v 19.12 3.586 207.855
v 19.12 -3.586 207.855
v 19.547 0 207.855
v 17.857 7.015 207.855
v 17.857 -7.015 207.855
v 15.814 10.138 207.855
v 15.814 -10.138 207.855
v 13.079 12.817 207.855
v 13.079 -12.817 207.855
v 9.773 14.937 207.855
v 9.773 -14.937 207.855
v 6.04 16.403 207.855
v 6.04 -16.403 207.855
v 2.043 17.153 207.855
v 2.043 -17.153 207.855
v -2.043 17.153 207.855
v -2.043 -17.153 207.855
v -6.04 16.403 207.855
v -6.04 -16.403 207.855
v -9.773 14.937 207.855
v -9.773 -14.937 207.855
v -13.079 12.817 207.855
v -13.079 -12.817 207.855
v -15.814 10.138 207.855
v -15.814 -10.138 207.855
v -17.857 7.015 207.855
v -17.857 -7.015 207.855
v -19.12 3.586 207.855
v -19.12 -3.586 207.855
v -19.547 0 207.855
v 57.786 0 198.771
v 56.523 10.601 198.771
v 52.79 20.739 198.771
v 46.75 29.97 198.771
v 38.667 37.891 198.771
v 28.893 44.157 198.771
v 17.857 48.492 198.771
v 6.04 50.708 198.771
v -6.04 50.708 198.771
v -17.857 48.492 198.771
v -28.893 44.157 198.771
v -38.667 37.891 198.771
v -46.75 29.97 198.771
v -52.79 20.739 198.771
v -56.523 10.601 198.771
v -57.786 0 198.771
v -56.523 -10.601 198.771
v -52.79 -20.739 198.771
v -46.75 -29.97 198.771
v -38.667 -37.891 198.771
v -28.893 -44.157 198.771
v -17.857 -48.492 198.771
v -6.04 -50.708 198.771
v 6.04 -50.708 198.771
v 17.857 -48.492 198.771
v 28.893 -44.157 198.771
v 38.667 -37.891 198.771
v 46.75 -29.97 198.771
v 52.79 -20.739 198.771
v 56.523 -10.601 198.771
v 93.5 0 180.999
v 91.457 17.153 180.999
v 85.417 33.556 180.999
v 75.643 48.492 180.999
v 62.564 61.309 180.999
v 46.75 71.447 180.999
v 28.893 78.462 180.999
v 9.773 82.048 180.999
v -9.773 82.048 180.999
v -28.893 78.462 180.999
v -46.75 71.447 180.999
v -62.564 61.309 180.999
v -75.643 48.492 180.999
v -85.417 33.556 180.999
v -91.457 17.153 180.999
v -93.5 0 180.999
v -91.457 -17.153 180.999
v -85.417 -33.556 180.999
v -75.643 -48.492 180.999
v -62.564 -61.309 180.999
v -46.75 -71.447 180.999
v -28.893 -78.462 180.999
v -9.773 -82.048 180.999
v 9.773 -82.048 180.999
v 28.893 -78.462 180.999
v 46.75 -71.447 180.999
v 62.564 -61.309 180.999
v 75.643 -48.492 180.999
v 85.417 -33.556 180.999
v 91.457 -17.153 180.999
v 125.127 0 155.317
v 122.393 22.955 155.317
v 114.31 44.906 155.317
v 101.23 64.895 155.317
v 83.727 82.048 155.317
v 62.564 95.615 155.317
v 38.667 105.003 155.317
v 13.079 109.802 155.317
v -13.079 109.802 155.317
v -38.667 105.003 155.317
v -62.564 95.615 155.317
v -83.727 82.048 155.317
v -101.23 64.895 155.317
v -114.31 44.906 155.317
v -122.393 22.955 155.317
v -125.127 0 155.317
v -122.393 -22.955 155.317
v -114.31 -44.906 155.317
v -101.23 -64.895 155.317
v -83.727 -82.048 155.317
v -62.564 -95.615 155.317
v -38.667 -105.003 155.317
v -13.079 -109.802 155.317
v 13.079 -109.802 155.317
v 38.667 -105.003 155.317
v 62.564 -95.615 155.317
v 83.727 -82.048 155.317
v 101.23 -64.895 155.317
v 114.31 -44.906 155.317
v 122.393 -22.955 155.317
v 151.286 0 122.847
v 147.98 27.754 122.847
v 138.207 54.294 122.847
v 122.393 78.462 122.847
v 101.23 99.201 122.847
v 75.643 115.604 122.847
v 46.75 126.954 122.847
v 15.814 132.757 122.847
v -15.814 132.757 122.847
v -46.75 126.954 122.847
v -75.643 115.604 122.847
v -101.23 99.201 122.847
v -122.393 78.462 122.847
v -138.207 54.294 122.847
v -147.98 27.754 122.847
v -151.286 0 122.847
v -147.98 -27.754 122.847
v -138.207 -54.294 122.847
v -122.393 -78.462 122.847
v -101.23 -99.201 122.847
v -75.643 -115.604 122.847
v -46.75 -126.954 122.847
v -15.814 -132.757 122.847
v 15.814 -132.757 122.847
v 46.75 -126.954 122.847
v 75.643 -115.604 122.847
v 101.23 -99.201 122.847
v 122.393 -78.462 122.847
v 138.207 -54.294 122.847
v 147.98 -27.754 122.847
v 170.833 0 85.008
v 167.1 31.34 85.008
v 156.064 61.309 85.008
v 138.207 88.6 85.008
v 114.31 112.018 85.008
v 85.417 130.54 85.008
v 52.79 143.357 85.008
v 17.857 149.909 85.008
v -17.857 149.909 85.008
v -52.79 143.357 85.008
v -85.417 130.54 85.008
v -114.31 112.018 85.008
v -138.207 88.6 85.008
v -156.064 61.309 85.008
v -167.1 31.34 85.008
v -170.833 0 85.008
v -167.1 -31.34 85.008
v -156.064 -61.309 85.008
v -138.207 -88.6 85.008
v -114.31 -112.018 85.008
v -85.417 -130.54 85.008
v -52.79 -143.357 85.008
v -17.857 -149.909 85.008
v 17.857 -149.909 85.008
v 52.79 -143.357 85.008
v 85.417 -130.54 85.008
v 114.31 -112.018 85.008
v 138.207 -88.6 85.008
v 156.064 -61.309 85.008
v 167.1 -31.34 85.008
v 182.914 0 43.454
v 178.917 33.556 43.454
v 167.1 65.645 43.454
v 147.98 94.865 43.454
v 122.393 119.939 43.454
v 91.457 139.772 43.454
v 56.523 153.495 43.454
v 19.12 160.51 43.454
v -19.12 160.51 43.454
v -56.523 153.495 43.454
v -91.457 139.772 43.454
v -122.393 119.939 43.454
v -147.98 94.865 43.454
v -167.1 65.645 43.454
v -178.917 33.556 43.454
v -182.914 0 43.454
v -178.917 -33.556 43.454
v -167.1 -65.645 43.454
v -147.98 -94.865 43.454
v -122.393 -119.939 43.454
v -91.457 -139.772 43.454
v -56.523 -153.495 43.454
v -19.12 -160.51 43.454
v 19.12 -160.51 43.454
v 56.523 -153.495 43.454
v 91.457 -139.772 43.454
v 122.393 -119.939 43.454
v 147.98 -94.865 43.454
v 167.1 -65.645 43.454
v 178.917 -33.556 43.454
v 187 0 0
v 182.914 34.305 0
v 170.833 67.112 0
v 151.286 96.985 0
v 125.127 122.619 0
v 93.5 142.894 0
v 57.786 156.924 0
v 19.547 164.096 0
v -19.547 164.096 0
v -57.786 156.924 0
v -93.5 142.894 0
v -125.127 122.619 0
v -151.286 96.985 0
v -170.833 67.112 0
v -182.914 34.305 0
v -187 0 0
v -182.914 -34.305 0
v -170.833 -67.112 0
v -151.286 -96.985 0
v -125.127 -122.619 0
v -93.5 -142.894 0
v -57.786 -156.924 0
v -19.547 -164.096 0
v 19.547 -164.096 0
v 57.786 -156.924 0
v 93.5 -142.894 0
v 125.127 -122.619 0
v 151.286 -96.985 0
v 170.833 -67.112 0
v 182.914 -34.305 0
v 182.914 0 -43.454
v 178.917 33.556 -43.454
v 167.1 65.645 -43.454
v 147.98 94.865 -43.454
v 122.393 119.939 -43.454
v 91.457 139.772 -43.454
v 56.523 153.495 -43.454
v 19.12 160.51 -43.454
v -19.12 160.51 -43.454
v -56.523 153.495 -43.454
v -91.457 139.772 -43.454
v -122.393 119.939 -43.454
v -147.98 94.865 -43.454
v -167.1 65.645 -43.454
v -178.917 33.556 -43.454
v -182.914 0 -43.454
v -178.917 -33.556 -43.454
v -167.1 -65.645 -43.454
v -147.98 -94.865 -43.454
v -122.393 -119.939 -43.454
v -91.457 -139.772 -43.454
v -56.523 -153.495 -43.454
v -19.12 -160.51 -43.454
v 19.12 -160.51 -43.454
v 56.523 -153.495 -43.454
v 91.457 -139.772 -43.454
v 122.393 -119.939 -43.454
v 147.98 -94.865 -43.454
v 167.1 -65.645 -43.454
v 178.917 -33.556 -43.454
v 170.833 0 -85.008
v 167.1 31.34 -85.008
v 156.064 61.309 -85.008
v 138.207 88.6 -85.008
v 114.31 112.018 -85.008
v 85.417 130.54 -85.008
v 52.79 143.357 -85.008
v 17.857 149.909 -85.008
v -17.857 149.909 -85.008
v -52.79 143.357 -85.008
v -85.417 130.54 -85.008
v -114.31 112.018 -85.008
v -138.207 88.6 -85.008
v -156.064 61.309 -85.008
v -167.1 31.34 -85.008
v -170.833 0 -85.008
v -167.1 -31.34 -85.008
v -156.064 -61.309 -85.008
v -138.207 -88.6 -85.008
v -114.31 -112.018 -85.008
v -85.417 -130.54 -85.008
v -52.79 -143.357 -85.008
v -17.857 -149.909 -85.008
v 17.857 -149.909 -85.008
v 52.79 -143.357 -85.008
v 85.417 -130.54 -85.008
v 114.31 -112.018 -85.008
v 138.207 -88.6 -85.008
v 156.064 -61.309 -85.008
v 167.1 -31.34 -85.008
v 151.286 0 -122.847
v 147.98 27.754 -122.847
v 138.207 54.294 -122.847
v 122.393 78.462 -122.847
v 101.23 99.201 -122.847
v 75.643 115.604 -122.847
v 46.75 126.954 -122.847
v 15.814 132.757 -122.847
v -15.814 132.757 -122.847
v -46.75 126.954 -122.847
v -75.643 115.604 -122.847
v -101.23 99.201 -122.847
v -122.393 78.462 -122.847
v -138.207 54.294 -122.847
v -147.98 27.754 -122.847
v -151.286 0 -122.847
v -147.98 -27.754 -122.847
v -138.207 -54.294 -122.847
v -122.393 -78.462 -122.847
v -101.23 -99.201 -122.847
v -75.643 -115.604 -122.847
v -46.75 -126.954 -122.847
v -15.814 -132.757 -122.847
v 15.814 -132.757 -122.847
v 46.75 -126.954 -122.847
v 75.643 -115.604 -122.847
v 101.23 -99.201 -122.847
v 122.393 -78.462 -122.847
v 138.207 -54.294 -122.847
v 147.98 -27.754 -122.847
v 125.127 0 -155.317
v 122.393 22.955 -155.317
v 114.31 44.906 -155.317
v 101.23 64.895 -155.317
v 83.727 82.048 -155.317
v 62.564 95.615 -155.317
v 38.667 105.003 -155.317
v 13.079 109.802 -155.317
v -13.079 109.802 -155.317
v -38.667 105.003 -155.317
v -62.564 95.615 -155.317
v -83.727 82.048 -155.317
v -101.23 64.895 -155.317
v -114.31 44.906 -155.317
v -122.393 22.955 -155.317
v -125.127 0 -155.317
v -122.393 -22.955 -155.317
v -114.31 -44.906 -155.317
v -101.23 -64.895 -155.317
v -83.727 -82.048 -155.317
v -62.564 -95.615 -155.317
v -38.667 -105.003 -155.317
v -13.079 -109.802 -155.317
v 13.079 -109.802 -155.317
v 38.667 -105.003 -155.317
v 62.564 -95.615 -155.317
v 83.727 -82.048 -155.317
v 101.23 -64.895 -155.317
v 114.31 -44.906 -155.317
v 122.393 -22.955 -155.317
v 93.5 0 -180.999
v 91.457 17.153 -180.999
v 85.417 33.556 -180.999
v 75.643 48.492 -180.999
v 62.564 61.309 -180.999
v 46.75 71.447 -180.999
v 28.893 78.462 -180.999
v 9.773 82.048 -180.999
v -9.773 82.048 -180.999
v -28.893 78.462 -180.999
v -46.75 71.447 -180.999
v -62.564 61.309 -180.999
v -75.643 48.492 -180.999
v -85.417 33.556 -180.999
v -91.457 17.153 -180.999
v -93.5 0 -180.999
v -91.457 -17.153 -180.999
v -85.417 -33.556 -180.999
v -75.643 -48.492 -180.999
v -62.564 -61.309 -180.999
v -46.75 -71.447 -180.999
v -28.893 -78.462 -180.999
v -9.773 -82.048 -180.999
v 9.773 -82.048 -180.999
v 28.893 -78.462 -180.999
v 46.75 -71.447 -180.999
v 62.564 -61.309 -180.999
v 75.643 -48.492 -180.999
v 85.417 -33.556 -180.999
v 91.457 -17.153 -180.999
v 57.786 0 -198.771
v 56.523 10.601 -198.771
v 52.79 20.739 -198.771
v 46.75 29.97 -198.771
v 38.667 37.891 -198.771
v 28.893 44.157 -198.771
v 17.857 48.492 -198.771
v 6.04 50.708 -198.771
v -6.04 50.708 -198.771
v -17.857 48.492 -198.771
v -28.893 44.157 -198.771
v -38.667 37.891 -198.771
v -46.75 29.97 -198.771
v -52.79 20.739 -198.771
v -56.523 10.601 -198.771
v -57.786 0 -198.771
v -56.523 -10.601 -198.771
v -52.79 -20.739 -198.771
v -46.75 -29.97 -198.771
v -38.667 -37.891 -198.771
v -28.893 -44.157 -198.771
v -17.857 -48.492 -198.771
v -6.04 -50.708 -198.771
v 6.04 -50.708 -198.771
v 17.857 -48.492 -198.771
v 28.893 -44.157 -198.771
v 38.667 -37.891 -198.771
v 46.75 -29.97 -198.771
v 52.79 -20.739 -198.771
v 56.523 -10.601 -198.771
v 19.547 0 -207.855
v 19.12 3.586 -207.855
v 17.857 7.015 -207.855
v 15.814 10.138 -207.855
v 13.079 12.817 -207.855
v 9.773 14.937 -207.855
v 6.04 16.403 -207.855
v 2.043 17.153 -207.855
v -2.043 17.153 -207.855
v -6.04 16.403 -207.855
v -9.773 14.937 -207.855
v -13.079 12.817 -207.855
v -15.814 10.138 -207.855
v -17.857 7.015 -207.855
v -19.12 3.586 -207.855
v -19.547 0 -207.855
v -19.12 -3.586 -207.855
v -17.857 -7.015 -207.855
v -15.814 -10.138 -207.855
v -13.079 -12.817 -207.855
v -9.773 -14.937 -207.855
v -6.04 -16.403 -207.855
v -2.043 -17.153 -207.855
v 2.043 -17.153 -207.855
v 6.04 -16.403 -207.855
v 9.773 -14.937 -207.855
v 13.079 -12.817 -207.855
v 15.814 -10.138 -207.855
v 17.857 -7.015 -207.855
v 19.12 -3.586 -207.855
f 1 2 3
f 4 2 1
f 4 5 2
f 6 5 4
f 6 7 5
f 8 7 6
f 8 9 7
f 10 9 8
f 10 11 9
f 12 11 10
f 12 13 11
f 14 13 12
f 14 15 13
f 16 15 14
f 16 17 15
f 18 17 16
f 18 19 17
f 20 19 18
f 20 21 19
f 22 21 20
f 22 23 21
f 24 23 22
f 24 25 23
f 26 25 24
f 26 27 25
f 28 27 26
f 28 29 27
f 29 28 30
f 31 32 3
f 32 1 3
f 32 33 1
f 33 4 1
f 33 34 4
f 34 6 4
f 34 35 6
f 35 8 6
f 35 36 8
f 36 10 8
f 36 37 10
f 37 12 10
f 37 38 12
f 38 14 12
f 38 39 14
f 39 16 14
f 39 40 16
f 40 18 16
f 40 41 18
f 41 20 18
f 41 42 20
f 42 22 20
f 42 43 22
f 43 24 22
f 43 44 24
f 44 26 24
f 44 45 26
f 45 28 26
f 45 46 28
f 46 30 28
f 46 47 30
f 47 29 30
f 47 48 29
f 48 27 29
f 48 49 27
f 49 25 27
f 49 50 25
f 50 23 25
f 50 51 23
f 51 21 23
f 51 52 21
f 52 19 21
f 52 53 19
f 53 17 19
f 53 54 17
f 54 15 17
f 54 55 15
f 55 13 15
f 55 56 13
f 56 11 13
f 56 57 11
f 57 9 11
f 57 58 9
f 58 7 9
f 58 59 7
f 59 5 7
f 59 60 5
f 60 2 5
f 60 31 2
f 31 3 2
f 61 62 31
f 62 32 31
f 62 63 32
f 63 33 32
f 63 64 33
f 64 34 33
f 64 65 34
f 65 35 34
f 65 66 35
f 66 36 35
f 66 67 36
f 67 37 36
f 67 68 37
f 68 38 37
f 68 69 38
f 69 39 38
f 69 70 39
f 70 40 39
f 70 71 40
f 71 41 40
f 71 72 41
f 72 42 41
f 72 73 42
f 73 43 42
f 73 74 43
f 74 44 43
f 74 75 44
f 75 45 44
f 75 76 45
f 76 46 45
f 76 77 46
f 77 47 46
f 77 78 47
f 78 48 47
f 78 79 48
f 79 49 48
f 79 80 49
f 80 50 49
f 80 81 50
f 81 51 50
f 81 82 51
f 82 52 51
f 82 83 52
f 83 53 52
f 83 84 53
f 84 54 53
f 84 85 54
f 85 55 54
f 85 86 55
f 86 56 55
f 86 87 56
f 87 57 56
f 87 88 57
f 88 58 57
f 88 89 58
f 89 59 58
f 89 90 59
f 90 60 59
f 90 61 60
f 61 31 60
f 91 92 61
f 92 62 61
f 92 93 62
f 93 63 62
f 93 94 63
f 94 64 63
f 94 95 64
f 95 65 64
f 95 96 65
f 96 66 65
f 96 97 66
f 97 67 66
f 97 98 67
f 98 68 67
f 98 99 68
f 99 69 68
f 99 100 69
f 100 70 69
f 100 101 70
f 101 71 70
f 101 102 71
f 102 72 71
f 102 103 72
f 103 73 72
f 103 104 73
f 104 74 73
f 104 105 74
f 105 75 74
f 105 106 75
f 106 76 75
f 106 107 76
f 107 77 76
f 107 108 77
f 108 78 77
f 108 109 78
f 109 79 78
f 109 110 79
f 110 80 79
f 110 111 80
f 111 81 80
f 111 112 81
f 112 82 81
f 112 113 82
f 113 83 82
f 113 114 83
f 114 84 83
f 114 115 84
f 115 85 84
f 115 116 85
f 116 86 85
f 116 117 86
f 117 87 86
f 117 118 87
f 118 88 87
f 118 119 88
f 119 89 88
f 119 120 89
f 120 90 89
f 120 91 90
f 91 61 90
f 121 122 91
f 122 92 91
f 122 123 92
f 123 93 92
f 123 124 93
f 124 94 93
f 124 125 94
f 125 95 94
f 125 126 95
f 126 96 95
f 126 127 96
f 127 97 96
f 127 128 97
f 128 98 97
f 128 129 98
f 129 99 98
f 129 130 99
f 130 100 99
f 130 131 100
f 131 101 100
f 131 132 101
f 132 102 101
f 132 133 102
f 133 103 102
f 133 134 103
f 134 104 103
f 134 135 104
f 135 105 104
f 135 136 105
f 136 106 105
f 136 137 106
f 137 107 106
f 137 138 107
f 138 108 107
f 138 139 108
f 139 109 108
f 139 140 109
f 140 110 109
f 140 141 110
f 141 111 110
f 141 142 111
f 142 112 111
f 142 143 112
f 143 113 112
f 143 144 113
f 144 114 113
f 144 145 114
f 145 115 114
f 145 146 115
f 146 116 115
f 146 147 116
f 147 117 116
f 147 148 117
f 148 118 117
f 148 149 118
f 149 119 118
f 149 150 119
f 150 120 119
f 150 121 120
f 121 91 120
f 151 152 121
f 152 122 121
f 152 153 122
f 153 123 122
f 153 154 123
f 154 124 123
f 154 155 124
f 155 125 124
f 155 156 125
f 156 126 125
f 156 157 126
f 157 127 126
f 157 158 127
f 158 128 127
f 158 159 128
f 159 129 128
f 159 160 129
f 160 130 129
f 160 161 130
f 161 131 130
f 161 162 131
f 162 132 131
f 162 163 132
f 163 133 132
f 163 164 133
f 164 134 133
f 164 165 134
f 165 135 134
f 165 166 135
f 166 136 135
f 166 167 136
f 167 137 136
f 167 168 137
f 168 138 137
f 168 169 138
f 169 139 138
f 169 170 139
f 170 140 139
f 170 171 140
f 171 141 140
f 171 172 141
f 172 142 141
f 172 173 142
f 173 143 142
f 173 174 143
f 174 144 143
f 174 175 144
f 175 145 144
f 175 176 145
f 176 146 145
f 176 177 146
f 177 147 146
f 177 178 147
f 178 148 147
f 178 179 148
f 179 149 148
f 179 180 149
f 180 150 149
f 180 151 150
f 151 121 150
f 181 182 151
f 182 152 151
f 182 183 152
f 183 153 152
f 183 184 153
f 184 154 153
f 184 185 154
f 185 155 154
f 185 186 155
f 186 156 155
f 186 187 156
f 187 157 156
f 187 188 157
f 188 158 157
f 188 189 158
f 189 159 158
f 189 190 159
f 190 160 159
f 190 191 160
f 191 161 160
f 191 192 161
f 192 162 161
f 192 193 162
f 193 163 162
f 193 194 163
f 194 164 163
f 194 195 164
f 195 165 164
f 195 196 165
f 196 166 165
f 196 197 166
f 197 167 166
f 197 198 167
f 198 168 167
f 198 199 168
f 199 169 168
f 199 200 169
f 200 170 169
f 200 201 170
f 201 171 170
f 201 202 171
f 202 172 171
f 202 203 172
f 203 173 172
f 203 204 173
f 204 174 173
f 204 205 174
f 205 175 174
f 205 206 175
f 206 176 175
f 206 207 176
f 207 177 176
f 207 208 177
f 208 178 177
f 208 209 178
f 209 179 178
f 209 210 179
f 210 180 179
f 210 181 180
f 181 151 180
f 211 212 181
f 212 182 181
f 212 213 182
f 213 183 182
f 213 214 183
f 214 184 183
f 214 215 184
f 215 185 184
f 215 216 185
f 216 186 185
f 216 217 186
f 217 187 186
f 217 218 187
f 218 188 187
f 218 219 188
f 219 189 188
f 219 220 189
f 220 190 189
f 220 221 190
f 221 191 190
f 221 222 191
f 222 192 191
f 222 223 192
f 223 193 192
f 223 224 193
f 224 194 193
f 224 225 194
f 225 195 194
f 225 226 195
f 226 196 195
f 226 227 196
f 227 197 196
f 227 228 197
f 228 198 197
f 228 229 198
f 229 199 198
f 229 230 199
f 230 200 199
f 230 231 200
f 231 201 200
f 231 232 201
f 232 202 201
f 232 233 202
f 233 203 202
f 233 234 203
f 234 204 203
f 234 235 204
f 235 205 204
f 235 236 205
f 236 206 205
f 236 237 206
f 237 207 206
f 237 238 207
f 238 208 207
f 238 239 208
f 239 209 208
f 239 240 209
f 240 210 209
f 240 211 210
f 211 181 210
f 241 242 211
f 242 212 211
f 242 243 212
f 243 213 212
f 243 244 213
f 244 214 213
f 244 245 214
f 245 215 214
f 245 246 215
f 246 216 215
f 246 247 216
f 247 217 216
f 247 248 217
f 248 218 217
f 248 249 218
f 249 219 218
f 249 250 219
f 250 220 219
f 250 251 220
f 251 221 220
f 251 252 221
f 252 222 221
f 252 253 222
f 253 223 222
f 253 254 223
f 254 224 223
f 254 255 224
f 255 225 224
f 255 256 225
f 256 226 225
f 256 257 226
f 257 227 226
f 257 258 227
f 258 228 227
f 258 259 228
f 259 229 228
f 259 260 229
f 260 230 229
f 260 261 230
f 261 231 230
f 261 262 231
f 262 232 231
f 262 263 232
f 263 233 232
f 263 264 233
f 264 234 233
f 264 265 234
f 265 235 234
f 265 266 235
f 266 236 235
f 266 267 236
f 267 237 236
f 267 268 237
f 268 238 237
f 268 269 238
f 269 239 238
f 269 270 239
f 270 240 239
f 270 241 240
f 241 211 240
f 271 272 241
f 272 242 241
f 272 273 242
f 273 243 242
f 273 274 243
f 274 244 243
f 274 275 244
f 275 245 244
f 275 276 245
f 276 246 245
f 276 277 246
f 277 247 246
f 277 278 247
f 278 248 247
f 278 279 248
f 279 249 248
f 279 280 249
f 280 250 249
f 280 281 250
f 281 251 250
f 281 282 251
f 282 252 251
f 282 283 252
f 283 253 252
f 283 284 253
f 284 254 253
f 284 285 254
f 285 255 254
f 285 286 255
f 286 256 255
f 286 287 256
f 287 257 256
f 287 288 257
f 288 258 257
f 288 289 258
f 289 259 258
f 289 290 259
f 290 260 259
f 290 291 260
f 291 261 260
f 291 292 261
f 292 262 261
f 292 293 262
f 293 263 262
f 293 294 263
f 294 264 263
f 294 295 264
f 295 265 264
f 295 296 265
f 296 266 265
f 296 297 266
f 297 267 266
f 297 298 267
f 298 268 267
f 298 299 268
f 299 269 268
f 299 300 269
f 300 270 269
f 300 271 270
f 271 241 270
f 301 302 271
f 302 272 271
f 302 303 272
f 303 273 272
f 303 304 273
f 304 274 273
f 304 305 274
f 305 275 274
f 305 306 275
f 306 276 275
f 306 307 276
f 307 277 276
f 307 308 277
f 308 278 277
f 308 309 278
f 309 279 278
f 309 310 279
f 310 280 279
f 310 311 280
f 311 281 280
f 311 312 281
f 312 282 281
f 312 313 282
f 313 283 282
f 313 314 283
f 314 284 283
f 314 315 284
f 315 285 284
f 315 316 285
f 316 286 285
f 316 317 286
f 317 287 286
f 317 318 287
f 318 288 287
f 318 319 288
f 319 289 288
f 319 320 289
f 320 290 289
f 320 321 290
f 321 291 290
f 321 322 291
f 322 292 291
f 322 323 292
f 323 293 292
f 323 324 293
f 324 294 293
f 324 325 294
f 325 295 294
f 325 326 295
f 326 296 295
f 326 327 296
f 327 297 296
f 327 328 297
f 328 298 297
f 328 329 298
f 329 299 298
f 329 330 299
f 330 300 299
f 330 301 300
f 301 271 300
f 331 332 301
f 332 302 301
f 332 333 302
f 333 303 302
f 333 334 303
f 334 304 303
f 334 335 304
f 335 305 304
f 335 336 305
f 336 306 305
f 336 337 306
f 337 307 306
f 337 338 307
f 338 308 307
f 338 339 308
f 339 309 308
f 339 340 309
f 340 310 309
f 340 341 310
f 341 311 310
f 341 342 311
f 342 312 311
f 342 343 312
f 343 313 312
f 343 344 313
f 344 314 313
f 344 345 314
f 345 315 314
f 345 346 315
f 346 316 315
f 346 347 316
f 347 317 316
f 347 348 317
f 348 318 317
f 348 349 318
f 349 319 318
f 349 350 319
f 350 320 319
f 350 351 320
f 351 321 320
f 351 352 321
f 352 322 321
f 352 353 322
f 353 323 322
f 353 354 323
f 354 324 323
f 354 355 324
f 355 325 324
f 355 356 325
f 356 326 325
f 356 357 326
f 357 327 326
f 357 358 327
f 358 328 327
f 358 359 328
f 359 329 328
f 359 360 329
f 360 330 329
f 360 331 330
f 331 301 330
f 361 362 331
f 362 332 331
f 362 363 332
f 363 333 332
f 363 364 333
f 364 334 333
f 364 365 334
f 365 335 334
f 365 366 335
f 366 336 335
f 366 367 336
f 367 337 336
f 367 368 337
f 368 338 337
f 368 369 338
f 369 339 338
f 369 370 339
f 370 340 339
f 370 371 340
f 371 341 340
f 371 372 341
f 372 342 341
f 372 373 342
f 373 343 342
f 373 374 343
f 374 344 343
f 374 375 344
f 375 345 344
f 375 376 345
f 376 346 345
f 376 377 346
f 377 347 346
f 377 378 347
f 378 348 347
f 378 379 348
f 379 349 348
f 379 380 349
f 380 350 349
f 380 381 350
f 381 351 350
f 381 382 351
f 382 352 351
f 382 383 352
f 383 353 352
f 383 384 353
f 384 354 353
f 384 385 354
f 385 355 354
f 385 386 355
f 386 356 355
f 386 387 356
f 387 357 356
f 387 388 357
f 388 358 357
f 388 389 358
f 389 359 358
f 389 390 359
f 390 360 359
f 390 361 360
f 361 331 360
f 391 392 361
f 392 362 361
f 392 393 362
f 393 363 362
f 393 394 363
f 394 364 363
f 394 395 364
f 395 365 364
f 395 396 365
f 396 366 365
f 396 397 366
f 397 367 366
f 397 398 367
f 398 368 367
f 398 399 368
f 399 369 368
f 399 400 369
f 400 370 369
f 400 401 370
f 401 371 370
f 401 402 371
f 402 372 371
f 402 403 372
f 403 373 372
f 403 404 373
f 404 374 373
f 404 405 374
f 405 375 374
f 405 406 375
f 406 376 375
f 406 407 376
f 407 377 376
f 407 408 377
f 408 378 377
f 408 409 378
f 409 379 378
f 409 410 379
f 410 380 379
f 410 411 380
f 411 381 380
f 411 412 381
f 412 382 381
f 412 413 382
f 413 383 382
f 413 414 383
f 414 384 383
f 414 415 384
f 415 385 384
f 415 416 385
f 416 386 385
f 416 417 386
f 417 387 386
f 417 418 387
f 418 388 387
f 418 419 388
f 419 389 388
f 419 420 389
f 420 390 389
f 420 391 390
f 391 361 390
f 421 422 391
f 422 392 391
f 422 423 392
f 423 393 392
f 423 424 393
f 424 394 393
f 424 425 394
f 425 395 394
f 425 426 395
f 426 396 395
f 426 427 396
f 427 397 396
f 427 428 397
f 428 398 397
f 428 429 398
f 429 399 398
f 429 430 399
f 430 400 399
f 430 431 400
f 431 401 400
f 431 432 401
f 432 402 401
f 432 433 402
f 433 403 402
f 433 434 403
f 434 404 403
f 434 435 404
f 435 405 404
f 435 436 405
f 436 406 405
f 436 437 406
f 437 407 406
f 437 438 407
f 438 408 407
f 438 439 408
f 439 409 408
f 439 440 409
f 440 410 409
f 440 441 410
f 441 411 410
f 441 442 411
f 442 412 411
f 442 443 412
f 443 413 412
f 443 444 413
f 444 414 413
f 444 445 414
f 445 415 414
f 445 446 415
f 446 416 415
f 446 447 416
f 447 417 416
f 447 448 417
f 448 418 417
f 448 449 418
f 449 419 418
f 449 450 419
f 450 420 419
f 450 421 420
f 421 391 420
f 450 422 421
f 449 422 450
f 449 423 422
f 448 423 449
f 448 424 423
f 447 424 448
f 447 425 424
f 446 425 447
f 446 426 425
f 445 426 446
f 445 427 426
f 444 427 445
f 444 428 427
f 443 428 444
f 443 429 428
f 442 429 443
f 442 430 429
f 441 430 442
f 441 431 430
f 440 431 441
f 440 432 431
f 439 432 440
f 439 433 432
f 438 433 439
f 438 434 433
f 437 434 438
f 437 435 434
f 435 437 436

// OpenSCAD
// Generated by SolidPython 1.0.1 on 2020-07-29 00:46:53


scale(v = [17, 15, 19]) {
	sphere(r = 11);
}
/***********************************************
*********      SolidPython code:      **********
************************************************
 
# import packages: SolidPython
from solid import *
from solid.utils import *
from itertools import chain, combinations, permutations


class Resize:

    def __init__(self, scad_file):
        self.scad_file = scad_file
        #self.scad_file = import_scad(scad_file)
        # cone/cylinder param:
        self.r1 = 0
        self.r2 = 0
        self.h = 0
        # rectangular prism param:
        self.w = 0
        self.l = 0
        # ellipse param:
        self.r = 0

    # import OpenScad code (file name corresponds to shape)


    # classify shape + parameters
    def assign(self, param1, param2, param3):
        if self.scad_file == 'cone.scad':
            self.r1 = param1
            self.r2 = param2
            self.h = param3
        elif self.scad_file == 'cylinder.scad':
            self.r1 = param1
            self.r2 = param2
            self.h = param3
        elif self.scad_file == 'rectangularPrism.scad':
            self.h = param1
            self.l = param2
            self.w = param3
        else:
            self.r = param1
            self.h = param2

    # resize parameters
    def iterate(self):
        x = range(3, 20, 2)
        i = 1
        if self.scad_file == 'cone.scad':
            tempList = list(permutations(x, 2))
            for temp in tempList:
                param1 = temp[0]
                param2 = temp[1]
                filepath = 'produced_scad_files/' + 'cone' + str(param1) + '_' + str(param2) + '_' + '.scad'
                scad_render_to_file(cylinder(h=param1, r1=param2, r2=0), filepath)

        elif self.scad_file == 'cylinder.scad':
            tempList = list(permutations(x, 3))
            for temp in tempList:
                param1 = temp[0]
                param2 = temp[1]
                filepath = 'produced_scad_files/' + 'cylinder' + str(param1) + '_' + str(param2) + '_' + '.scad'
                scad_render_to_file(cylinder(h=param1, r1=param2, r2=param2), filepath)

        elif self.scad_file == 'rectangularPrism.scad':
            tempList = list(permutations(x, 3))
            for temp in tempList:
                param1 = temp[0]
                param2 = temp[1]
                param3 = temp[2]
                filepath = 'produced_scad_files/' + 'rectangularPrism' + str(param1) + '_' + str(param2) + '_' + str(
                    param3) + '.scad'
                scad_render_to_file(cube(size=(param1, param2, param3)), filepath)

        elif self.scad_file == 'ellipse.scad':
            tempList = list(permutations(x, 4))
            for temp in tempList:
                param1 = temp[0]
                param2 = temp[1]
                param3 = temp[2]
                param4 = temp[3]
                filepath = 'produced_scad_files/' + 'ellipse' + str(param1) + '_' + str(param2) + '_' + str(param3) + '_' + str(param4) + '.scad'
                scad_render_to_file(scale([param1, param2, param3])(sphere(r=param4)), filepath)

    def render_to_scadfile(self):
        scad_render_to_file(scad, 'example.scad') 
 
************************************************/
